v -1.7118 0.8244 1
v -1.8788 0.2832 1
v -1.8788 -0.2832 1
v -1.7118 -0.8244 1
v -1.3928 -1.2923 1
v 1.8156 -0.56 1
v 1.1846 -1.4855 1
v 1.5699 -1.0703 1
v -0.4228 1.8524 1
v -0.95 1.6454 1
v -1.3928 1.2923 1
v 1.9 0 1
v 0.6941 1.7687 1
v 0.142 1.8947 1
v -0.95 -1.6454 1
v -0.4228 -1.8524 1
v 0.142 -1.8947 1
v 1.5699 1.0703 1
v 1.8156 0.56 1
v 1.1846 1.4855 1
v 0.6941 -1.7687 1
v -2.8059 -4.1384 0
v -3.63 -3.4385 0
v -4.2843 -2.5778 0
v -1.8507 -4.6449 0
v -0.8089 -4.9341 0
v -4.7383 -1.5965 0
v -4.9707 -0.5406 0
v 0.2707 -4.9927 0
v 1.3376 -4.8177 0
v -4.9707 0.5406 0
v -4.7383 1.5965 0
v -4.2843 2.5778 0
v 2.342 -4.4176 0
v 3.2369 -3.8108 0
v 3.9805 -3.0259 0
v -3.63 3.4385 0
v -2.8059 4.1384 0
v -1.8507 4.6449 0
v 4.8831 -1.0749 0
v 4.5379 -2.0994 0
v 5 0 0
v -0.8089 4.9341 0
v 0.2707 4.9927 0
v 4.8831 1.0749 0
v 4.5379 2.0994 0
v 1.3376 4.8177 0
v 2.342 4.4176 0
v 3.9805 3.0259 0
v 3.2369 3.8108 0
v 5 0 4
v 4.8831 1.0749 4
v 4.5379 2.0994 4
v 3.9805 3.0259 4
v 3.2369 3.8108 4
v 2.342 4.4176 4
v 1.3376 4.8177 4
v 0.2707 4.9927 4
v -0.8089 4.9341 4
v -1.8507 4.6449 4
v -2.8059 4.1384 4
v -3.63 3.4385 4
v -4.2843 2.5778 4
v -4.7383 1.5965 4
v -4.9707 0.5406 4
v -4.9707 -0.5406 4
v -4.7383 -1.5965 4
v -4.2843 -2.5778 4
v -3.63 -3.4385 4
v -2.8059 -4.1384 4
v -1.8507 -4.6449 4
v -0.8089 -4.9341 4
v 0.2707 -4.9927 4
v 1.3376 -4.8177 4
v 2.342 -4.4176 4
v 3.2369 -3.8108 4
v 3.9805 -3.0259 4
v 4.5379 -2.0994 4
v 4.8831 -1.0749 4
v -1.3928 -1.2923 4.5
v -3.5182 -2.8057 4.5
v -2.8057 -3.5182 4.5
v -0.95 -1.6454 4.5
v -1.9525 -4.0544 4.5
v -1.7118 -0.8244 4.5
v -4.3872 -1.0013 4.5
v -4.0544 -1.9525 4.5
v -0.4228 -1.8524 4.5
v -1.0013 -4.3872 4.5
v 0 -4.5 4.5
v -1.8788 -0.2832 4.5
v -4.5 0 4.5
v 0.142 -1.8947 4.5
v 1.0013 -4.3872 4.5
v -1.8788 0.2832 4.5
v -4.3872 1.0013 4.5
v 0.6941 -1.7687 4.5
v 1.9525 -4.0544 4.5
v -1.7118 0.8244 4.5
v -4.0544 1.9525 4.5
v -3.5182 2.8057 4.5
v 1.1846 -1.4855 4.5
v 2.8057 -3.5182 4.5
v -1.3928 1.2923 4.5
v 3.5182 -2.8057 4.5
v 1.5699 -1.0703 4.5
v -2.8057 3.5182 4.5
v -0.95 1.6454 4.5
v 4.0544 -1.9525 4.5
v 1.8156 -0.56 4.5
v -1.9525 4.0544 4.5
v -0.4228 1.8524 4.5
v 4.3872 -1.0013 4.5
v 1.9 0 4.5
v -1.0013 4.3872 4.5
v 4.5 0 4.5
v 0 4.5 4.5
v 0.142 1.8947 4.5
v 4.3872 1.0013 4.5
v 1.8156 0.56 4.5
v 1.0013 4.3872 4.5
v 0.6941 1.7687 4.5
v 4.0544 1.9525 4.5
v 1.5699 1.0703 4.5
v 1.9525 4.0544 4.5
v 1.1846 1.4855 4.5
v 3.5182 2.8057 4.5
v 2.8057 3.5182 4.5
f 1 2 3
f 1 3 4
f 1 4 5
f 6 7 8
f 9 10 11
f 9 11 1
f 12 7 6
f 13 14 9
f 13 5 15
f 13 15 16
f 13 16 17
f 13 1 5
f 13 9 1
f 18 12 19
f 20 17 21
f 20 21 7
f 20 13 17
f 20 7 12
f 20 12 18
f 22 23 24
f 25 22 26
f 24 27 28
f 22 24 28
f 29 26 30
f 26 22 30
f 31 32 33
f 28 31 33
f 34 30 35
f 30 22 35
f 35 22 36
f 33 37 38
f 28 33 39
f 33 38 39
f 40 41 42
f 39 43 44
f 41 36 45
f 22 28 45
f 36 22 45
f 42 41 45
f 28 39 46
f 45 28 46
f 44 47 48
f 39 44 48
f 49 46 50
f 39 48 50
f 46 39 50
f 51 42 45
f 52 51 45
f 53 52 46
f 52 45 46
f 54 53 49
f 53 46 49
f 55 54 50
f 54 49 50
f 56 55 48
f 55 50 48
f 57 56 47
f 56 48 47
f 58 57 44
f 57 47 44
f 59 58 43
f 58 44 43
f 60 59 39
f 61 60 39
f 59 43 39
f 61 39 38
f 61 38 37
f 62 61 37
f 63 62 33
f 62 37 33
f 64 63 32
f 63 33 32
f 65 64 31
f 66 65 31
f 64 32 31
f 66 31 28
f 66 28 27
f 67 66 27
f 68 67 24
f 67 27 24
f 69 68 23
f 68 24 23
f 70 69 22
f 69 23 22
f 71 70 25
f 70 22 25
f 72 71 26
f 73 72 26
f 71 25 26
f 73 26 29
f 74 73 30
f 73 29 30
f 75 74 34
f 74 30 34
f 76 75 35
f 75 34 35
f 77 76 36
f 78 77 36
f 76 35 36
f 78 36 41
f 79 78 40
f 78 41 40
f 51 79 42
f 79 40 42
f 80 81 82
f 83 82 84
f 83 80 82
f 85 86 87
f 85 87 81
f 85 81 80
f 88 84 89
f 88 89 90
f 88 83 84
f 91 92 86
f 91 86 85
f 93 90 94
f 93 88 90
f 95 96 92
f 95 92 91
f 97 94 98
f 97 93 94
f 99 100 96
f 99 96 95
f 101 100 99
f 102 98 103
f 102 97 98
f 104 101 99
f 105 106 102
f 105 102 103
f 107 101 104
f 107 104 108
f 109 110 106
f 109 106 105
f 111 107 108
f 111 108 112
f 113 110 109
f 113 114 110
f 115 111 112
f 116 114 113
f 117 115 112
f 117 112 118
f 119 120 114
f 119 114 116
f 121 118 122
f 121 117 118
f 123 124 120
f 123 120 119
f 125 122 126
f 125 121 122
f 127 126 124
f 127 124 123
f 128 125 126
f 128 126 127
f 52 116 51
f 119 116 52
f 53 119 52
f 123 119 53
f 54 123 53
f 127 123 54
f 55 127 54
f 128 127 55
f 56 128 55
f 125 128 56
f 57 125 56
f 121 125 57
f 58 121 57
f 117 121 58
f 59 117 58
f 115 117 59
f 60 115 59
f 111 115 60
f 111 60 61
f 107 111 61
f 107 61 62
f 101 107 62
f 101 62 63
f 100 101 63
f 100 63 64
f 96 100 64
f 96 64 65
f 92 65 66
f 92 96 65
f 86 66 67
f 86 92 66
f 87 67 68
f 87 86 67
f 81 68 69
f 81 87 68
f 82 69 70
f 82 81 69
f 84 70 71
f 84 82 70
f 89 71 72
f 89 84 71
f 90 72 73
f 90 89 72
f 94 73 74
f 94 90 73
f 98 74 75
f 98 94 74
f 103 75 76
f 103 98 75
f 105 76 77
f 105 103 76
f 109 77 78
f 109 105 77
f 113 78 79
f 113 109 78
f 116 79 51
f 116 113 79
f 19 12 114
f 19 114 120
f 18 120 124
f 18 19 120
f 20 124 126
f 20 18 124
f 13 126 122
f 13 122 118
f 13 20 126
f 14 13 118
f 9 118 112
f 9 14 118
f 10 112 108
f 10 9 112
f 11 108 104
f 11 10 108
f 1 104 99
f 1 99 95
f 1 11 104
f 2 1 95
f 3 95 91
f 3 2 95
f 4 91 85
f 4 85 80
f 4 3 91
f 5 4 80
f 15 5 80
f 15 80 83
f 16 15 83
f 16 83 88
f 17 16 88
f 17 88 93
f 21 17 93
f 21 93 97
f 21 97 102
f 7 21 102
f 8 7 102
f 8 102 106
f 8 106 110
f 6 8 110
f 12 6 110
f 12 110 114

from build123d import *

# Parameters (mm, degrees)
F0_R     = 5
F0_R_2   = 1.9
F1_DEPTH = 4.5
F2_DEPTH = 1
F3_SIZE  = 0.5


with BuildPart() as f1:
    # F0 (on Top) → F1 (new body)
    with BuildSketch(Plane.XY):
        Circle(F0_R)
        Circle(F0_R_2, mode=Mode.SUBTRACT)
    extrude(amount=F1_DEPTH)

    # F0 (on Top) → F2 (join)
    with BuildSketch(Plane.XY):
        Circle(F0_R_2)
    extrude(amount=F2_DEPTH)

    # F3
    f3_edges = [f1.edges().sort_by_distance(p)[0] for p in [
        (-5, 0, 4.5),
    ]]
    chamfer(f3_edges, length=F3_SIZE)


solid = f1.part
